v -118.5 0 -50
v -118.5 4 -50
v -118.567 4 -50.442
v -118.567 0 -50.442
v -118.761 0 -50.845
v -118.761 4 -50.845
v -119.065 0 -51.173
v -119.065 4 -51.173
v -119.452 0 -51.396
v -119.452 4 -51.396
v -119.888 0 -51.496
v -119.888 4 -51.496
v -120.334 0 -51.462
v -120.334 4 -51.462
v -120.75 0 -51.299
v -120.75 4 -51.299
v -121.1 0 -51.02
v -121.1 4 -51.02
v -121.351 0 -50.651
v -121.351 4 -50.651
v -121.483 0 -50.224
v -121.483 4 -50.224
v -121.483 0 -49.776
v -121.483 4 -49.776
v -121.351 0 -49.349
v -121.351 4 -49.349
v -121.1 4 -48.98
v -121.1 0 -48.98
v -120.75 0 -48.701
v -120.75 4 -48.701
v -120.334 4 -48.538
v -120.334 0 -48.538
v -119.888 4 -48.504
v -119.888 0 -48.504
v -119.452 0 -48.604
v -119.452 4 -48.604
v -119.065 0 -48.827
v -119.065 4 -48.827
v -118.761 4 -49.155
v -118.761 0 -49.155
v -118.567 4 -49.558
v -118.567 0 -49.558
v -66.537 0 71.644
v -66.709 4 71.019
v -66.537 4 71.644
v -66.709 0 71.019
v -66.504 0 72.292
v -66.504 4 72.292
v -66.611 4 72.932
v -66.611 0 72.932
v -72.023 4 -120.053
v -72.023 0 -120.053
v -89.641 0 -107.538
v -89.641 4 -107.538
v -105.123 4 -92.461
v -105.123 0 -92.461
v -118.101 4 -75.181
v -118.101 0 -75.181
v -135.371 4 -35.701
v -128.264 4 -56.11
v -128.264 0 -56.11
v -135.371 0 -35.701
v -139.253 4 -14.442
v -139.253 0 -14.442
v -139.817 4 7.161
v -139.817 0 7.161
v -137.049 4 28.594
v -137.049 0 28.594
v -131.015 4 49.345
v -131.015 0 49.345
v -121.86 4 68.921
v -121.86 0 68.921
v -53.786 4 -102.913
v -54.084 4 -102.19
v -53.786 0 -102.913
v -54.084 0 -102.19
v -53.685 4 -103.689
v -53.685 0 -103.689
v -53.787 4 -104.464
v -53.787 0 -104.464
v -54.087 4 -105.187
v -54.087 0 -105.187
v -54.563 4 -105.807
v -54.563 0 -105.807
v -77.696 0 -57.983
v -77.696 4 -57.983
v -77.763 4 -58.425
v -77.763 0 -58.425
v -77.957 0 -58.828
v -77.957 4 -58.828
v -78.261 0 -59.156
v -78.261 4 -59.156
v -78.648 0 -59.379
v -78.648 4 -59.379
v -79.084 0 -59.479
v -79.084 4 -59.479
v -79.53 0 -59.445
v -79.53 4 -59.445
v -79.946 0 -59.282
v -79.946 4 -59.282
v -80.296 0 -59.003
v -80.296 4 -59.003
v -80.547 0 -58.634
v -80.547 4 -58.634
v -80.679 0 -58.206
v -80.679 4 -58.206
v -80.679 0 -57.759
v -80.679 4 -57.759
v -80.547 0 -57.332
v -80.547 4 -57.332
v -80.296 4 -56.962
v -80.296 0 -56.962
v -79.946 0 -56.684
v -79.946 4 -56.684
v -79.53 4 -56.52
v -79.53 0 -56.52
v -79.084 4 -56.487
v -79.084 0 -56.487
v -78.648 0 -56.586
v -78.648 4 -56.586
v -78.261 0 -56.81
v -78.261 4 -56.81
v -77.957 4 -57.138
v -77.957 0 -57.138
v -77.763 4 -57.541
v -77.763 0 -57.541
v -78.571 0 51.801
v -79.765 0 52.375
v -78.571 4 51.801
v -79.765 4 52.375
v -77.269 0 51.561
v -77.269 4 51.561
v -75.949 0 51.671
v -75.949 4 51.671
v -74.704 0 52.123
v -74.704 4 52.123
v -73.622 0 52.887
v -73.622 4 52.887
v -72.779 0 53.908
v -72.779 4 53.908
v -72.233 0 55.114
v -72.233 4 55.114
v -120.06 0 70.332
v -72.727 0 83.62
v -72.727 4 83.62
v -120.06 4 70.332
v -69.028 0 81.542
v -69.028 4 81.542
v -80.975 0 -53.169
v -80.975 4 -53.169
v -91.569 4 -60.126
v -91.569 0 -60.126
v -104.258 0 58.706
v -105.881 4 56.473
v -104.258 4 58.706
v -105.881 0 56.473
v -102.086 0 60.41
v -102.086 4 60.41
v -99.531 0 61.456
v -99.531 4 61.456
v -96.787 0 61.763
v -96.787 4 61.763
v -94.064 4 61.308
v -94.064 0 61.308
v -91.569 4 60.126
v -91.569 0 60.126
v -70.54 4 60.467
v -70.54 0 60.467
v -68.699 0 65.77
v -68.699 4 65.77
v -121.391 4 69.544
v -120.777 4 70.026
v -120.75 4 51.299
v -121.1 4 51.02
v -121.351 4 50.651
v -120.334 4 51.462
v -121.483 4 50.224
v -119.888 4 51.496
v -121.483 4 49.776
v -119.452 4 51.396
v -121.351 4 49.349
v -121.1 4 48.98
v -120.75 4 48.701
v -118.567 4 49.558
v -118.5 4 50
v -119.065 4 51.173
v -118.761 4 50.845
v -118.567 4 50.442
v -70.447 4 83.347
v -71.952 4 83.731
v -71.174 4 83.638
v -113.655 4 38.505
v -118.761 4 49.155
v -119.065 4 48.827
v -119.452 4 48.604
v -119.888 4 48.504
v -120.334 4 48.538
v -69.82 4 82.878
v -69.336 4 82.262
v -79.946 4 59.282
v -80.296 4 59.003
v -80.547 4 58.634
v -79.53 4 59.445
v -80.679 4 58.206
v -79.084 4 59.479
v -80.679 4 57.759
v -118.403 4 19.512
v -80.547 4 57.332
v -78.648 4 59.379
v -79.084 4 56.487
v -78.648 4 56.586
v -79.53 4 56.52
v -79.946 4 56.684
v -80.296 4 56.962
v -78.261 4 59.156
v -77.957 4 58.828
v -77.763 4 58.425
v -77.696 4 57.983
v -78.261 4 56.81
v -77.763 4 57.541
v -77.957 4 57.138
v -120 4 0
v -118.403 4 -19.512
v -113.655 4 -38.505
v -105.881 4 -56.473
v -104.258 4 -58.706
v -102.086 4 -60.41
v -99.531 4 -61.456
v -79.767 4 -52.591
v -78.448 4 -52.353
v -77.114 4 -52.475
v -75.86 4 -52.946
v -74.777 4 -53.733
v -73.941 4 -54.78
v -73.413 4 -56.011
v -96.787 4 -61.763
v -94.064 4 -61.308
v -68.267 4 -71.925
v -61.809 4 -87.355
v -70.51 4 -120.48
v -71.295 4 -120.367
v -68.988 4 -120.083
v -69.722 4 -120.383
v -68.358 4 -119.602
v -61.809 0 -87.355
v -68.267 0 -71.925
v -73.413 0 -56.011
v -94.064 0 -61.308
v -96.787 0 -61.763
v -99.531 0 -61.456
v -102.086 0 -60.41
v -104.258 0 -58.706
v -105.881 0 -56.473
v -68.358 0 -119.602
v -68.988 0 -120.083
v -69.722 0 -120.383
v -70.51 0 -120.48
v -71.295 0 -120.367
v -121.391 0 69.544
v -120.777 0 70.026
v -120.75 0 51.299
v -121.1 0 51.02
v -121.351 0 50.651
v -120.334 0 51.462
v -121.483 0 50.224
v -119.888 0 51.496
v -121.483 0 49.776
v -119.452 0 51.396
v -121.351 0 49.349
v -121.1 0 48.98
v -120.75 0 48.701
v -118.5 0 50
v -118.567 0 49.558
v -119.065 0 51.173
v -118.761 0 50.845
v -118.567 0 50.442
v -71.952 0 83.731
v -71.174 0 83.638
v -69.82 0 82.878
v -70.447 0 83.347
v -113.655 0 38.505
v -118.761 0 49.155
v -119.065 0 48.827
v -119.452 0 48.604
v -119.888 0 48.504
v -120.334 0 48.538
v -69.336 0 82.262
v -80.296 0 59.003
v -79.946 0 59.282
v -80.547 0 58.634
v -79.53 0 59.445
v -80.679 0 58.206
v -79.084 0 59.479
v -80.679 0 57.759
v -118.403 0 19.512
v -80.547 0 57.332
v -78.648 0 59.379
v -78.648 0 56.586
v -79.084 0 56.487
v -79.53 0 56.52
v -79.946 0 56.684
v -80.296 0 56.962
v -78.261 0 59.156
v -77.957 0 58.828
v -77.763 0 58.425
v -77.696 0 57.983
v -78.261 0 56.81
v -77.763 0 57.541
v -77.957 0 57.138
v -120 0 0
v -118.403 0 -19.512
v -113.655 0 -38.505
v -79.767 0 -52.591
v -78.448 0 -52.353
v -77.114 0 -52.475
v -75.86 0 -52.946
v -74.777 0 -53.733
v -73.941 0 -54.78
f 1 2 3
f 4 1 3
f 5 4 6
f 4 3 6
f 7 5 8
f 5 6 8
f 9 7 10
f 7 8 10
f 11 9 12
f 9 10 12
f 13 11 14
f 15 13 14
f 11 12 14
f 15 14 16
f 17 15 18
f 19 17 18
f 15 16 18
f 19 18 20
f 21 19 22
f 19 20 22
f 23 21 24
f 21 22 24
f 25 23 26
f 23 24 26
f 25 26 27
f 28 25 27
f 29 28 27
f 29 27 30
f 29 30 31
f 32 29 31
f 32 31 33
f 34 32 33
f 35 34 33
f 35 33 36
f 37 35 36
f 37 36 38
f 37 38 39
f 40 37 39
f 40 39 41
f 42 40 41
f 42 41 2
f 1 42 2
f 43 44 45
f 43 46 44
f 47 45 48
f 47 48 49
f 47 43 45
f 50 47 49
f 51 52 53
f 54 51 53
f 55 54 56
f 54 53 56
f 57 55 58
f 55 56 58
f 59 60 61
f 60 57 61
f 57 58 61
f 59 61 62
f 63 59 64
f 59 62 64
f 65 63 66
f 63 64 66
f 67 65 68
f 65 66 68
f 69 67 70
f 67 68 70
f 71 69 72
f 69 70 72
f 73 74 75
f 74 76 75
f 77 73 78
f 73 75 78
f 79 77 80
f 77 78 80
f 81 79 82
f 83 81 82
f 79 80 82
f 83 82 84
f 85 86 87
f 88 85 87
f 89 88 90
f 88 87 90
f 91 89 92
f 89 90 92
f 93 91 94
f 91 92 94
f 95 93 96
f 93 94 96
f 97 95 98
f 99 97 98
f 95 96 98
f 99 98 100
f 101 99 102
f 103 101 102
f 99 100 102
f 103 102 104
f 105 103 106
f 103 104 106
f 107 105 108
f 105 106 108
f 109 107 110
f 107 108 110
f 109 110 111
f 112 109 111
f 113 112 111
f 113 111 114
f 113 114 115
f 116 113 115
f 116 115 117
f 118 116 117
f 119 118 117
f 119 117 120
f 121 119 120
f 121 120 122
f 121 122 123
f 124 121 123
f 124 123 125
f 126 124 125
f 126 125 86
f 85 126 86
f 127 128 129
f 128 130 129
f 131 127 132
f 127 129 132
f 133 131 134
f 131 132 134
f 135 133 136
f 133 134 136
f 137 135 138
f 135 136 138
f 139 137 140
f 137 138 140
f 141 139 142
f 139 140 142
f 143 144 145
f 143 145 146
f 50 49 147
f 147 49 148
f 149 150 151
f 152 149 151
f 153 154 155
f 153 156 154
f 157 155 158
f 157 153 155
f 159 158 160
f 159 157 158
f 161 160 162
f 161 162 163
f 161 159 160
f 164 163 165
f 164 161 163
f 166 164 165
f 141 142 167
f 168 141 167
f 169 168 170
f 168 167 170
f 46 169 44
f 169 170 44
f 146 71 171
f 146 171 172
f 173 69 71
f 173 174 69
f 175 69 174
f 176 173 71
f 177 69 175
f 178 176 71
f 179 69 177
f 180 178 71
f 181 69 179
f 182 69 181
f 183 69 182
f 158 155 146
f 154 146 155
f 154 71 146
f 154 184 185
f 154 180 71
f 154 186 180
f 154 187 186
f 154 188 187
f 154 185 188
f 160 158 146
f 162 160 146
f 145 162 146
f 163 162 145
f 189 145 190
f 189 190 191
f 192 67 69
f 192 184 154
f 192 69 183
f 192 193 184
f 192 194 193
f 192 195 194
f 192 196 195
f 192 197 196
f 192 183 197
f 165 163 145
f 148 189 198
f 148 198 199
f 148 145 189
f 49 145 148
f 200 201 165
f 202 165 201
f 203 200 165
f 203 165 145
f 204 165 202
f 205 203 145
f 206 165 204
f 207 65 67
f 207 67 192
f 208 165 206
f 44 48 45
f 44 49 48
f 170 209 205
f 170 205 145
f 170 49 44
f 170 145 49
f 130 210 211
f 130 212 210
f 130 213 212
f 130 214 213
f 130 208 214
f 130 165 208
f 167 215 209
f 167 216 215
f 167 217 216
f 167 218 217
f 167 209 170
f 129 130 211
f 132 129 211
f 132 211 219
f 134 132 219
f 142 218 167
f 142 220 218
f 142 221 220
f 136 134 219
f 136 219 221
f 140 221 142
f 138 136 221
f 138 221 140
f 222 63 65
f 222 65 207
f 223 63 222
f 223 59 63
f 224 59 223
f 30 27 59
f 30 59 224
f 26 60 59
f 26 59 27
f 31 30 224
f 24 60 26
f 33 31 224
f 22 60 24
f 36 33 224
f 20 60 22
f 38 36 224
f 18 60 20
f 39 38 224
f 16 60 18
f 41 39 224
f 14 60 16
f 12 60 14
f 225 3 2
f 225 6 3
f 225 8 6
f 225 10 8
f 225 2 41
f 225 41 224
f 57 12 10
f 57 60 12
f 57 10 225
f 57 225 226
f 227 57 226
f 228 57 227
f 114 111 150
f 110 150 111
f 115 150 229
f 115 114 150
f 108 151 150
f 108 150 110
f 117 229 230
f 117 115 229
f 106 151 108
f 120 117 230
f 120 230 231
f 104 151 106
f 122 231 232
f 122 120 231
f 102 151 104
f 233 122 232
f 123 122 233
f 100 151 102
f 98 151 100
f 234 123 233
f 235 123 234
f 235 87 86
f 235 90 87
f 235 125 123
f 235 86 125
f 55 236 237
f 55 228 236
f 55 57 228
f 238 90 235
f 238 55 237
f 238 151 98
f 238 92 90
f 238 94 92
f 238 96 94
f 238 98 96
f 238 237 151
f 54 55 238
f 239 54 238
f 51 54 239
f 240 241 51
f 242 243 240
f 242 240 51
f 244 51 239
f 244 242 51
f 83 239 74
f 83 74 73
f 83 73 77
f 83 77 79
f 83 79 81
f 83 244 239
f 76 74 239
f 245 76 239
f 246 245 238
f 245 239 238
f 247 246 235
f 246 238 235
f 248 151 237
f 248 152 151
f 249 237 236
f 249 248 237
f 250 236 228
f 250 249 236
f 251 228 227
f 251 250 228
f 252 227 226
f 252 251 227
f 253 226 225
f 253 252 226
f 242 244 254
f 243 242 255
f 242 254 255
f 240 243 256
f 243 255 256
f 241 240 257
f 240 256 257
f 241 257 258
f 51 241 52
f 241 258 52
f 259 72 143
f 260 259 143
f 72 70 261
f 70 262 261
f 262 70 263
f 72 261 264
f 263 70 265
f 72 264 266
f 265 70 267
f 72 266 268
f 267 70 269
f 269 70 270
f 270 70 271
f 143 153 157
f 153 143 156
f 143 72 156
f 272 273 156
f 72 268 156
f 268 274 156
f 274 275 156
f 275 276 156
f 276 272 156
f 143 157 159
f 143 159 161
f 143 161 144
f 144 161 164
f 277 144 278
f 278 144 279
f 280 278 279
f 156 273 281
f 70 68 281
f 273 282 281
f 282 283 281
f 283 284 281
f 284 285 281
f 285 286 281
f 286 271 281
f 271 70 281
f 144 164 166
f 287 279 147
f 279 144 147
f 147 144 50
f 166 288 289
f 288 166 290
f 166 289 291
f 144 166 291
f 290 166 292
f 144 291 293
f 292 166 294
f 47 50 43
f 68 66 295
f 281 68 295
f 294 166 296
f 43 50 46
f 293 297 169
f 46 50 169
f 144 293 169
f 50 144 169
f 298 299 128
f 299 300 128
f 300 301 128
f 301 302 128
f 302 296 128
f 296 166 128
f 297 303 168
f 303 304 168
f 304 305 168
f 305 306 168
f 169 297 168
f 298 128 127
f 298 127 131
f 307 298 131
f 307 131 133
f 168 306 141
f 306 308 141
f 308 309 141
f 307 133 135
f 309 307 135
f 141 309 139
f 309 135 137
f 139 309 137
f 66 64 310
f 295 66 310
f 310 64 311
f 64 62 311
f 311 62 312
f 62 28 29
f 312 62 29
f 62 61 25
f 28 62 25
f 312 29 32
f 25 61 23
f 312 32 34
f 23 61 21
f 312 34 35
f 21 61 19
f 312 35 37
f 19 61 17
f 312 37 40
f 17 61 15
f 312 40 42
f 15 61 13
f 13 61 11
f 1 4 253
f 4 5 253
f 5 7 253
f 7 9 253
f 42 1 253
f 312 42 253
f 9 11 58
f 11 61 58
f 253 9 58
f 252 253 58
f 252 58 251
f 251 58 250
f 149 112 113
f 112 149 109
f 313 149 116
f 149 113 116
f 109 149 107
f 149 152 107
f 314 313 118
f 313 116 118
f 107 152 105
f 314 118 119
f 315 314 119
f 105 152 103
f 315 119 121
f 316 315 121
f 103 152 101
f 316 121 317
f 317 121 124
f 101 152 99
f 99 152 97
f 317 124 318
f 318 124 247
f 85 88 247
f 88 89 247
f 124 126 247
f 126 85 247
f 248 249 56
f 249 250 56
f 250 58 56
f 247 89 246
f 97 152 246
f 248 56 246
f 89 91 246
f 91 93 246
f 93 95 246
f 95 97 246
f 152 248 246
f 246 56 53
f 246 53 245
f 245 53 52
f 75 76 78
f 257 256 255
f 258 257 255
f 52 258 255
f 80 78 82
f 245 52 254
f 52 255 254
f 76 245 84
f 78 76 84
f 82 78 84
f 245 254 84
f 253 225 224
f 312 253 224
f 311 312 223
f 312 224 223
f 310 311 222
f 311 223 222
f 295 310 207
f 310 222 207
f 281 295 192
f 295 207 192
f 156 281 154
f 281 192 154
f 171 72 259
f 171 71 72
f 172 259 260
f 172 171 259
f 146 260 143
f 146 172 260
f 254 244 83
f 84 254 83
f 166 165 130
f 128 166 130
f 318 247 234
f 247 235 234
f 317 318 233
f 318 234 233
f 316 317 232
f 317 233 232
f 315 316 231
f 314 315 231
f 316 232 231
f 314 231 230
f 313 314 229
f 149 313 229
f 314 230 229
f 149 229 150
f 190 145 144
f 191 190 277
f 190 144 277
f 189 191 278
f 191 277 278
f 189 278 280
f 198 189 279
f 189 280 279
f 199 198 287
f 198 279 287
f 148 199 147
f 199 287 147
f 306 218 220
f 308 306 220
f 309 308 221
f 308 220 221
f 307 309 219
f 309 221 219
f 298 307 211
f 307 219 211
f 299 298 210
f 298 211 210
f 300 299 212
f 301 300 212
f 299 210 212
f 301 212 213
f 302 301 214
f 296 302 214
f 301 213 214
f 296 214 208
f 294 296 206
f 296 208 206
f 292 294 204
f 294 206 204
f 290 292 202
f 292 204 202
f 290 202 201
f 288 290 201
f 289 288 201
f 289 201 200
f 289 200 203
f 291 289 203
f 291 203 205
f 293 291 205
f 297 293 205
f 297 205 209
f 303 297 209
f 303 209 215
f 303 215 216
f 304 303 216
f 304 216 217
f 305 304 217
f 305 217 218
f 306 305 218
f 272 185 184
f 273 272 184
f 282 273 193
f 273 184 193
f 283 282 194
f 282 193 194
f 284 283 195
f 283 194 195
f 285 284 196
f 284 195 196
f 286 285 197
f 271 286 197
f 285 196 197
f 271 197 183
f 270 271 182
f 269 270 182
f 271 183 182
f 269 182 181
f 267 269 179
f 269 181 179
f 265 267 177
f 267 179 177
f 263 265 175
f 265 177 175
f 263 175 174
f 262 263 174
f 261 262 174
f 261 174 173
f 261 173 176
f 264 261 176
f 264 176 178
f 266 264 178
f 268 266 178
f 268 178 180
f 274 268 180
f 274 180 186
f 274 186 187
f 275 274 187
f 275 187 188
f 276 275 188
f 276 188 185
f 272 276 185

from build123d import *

# Parameters (mm, degrees)
SKETCH1_R               = 140
BOSS_EXTRUDE1_DEPTH     = 4
CUT_EXTRUDE1_REACH      = 6
CUT_EXTRUDE3_REACH      = 6
SKETCH19_R              = 1.5
CUT_EXTRUDE4_REACH      = 6
FILLET2_R               = 10
CUT_EXTRUDE8_DEPTH      = 1
CUT_EXTRUDE8_DEPTH_BACK = 5
CUT_EXTRUDE9_REACH      = 6
FILLET4_R               = 5
FILLET6_R               = 10
CUT_EXTRUDE10_REACH     = 6
SKETCH25_R              = 1.5
FILLET5_R               = 3


with BuildPart() as part:
    # Sketch1 → Boss-Extrude1 (new body)
    with BuildSketch(Plane(origin=(0, 0, 0), x_dir=(1, 0, 0), z_dir=(0, 1, 0))):
        Circle(SKETCH1_R)
    extrude(amount=BOSS_EXTRUDE1_DEPTH)

    # Sketch17 → Cut-Extrude1 (cut, up to next)
    with BuildSketch(Plane.XZ, mode=Mode.PRIVATE) as cut_extrude1_sk1:
        Polygon((-50, 90), (-121.24355653, 70), (-121.24355653, 140), (121.24355653, 140), (121.24355653, 70), (50, 90), align=None)
    cut_extrude1_tool1 = extrude(cut_extrude1_sk1.sketch, amount=-CUT_EXTRUDE1_REACH, mode=Mode.PRIVATE) & part.part
    add(cut_extrude1_tool1.solids().sort_by_distance((0, 0, 111.669853))[0], mode=Mode.SUBTRACT)

    # Sketch19 → Cut-Extrude3 (cut, up to next)
    with BuildSketch(Plane(origin=(0, 4, 0), x_dir=(1, 0, 0), z_dir=(0, 1, 0)), mode=Mode.PRIVATE) as cut_extrude3_sk1:
        with Locations((-79.195959493, -57.982756057)):
            Circle(SKETCH19_R)
    cut_extrude3_tool1 = extrude(cut_extrude3_sk1.sketch, amount=-CUT_EXTRUDE3_REACH, mode=Mode.PRIVATE) & part.part
    add(cut_extrude3_tool1.solids().sort_by_distance((-79.195959, 4, 57.982756))[0], mode=Mode.SUBTRACT)
    # Sketch19 → Cut-Extrude3 (cut, up to next)
    with BuildSketch(Plane(origin=(0, 4, 0), x_dir=(1, 0, 0), z_dir=(0, 1, 0)), mode=Mode.PRIVATE) as cut_extrude3_sk2:
        with Locations((-79.195959493, 57.982756057)):
            Circle(SKETCH19_R)
    cut_extrude3_tool2 = extrude(cut_extrude3_sk2.sketch, amount=-CUT_EXTRUDE3_REACH, mode=Mode.PRIVATE) & part.part
    add(cut_extrude3_tool2.solids().sort_by_distance((-79.195959, 4, -57.982756))[0], mode=Mode.SUBTRACT)
    # Sketch19 → Cut-Extrude3 (cut, up to next)
    with BuildSketch(Plane(origin=(0, 4, 0), x_dir=(1, 0, 0), z_dir=(0, 1, 0)), mode=Mode.PRIVATE) as cut_extrude3_sk3:
        with Locations((79.195959493, 57.982756057)):
            Circle(SKETCH19_R)
    cut_extrude3_tool3 = extrude(cut_extrude3_sk3.sketch, amount=-CUT_EXTRUDE3_REACH, mode=Mode.PRIVATE) & part.part
    add(cut_extrude3_tool3.solids().sort_by_distance((79.195959, 4, -57.982756))[0], mode=Mode.SUBTRACT)
    # Sketch19 → Cut-Extrude3 (cut, up to next)
    with BuildSketch(Plane(origin=(0, 4, 0), x_dir=(1, 0, 0), z_dir=(0, 1, 0)), mode=Mode.PRIVATE) as cut_extrude3_sk4:
        with Locations((79.195959493, -57.982756057)):
            Circle(SKETCH19_R)
    cut_extrude3_tool4 = extrude(cut_extrude3_sk4.sketch, amount=-CUT_EXTRUDE3_REACH, mode=Mode.PRIVATE) & part.part
    add(cut_extrude3_tool4.solids().sort_by_distance((79.195959, 4, 57.982756))[0], mode=Mode.SUBTRACT)
    # Sketch19 → Cut-Extrude3 (cut, up to next)
    with BuildSketch(Plane(origin=(0, 4, 0), x_dir=(1, 0, 0), z_dir=(0, 1, 0)), mode=Mode.PRIVATE) as cut_extrude3_sk5:
        with Locations((-57.982756057, 79.195959493)):
            Circle(SKETCH19_R)
    cut_extrude3_tool5 = extrude(cut_extrude3_sk5.sketch, amount=-CUT_EXTRUDE3_REACH, mode=Mode.PRIVATE) & part.part
    add(cut_extrude3_tool5.solids().sort_by_distance((-57.982756, 4, -79.195959))[0], mode=Mode.SUBTRACT)
    # Sketch19 → Cut-Extrude3 (cut, up to next)
    with BuildSketch(Plane(origin=(0, 4, 0), x_dir=(1, 0, 0), z_dir=(0, 1, 0)), mode=Mode.PRIVATE) as cut_extrude3_sk6:
        with Locations((57.982756057, 79.195959493)):
            Circle(SKETCH19_R)
    cut_extrude3_tool6 = extrude(cut_extrude3_sk6.sketch, amount=-CUT_EXTRUDE3_REACH, mode=Mode.PRIVATE) & part.part
    add(cut_extrude3_tool6.solids().sort_by_distance((57.982756, 4, -79.195959))[0], mode=Mode.SUBTRACT)
    # Sketch19 → Cut-Extrude3 (cut, up to next)
    with BuildSketch(Plane(origin=(0, 4, 0), x_dir=(1, 0, 0), z_dir=(0, 1, 0)), mode=Mode.PRIVATE) as cut_extrude3_sk7:
        with Locations((57.982756057, -79.195959493)):
            Circle(SKETCH19_R)
    cut_extrude3_tool7 = extrude(cut_extrude3_sk7.sketch, amount=-CUT_EXTRUDE3_REACH, mode=Mode.PRIVATE) & part.part
    add(cut_extrude3_tool7.solids().sort_by_distance((57.982756, 4, 79.195959))[0], mode=Mode.SUBTRACT)
    # Sketch19 → Cut-Extrude3 (cut, up to next)
    with BuildSketch(Plane(origin=(0, 4, 0), x_dir=(1, 0, 0), z_dir=(0, 1, 0)), mode=Mode.PRIVATE) as cut_extrude3_sk8:
        with Locations((-57.982756057, -79.195959493)):
            Circle(SKETCH19_R)
    cut_extrude3_tool8 = extrude(cut_extrude3_sk8.sketch, amount=-CUT_EXTRUDE3_REACH, mode=Mode.PRIVATE) & part.part
    add(cut_extrude3_tool8.solids().sort_by_distance((-57.982756, 4, 79.195959))[0], mode=Mode.SUBTRACT)

    # Sketch20 → Cut-Extrude4 (cut, up to next)
    with BuildSketch(Plane(origin=(0, 4, 0), x_dir=(1, 0, 0), z_dir=(0, 1, 0)), mode=Mode.PRIVATE) as cut_extrude4_sk1:
        Polygon((-498.316459894, 549.560016424), (-70, 121.24355653), (-50, 101.24355653), (50, 101.24355653), (70, 121.24355653), (498.316459894, 549.560016424), (498.316459894, 1761.021909565), (-498.316459894, 1761.021909565), align=None)
    cut_extrude4_tool1 = extrude(cut_extrude4_sk1.sketch, amount=-CUT_EXTRUDE4_REACH, mode=Mode.PRIVATE) & part.part
    add(cut_extrude4_tool1.solids().sort_by_distance((0, 4, -1025.243605))[0], mode=Mode.SUBTRACT)

    # Fillet2
    fillet2_edges = [part.edges().sort_by_distance(p)[0] for p in [
        (50, 2, -101.24355653),
        (-50, 2, -101.24355653),
    ]]
    fillet(fillet2_edges, radius=FILLET2_R)

    # Sketch23 → Cut-Extrude8 (cut, two sides)
    with BuildSketch(Plane(origin=(0, 4, 0), x_dir=(1, 0, 0), z_dir=(0, 1, 0))) as cut_extrude8_sk:
        with BuildLine():
            Line((261.924008605, 637.436261059), (-52.928932188, 104.172488718))
            ThreePointArc((-52.928932188, 104.172488718), (-80.130232259, 17.669229552), (-66.336519501, -71.95475195))
            Line((-66.336519501, -71.95475195), (-73.189737717, -96.367133919))
            Line((-73.189737717, -96.367133919), (-240.56703475, -692.594830068))
            Line((-240.56703475, -692.594830068), (918.053550165, -1130.326301498))
            Line((918.053550165, -1130.326301498), (1420.54459352, 199.704789628))
            Line((1420.54459352, 199.704789628), (261.924008605, 637.436261059))
        make_face()
    extrude(amount=CUT_EXTRUDE8_DEPTH, mode=Mode.SUBTRACT)
    extrude(cut_extrude8_sk.sketch, amount=-CUT_EXTRUDE8_DEPTH_BACK, mode=Mode.SUBTRACT)

    # Sketch24 → Cut-Extrude9 (cut, up to next)
    with BuildSketch(Plane(origin=(0, 4, 0), x_dir=(1, 0, 0), z_dir=(0, 1, 0)), mode=Mode.PRIVATE) as cut_extrude9_sk1:
        with BuildLine():
            Line((0, 0), (-100.308962252, 65.864346136))
            ThreePointArc((-100.308962252, 65.864346136), (-120, 0), (-100.308962252, -65.864346136))
            Line((-100.308962252, -65.864346136), (0, 0))
        make_face()
    cut_extrude9_tool1 = extrude(cut_extrude9_sk1.sketch, amount=-CUT_EXTRUDE9_REACH, mode=Mode.PRIVATE) & part.part
    add(cut_extrude9_tool1.solids().sort_by_distance((-75.574375, 4, 0))[0], mode=Mode.SUBTRACT)

    # Fillet4
    fillet4_edges = [part.edges().sort_by_distance(p)[0] for p in [
        (-74.063830686, 2, 48.63140512),
        (-75.142204111, 2, -49.339481038),
    ]]
    fillet(fillet4_edges, radius=FILLET4_R)

    # Fillet6
    fillet6_edges = [part.edges().sort_by_distance(p)[0] for p in [
        (-100.308962252, 2, 65.864346136),
        (-100.308962252, 2, -65.864346136),
    ]]
    fillet(fillet6_edges, radius=FILLET6_R)

    # Sketch25 → Cut-Extrude10 (cut, up to next)
    with BuildSketch(Plane(origin=(0, 4, 0), x_dir=(1, 0, 0), z_dir=(0, 1, 0)), mode=Mode.PRIVATE) as cut_extrude10_sk1:
        with Locations((-120, 50)):
            Circle(SKETCH25_R)
    cut_extrude10_tool1 = extrude(cut_extrude10_sk1.sketch, amount=-CUT_EXTRUDE10_REACH, mode=Mode.PRIVATE) & part.part
    add(cut_extrude10_tool1.solids().sort_by_distance((-120, 4, -50))[0], mode=Mode.SUBTRACT)
    # Sketch25 → Cut-Extrude10 (cut, up to next)
    with BuildSketch(Plane(origin=(0, 4, 0), x_dir=(1, 0, 0), z_dir=(0, 1, 0)), mode=Mode.PRIVATE) as cut_extrude10_sk2:
        with Locations((-120, -50)):
            Circle(SKETCH25_R)
    cut_extrude10_tool2 = extrude(cut_extrude10_sk2.sketch, amount=-CUT_EXTRUDE10_REACH, mode=Mode.PRIVATE) & part.part
    add(cut_extrude10_tool2.solids().sort_by_distance((-120, 4, 50))[0], mode=Mode.SUBTRACT)

    # Fillet5
    fillet5_edges = [part.edges().sort_by_distance(p)[0] for p in [
        (-121.24355653, 2, 70),
        (-70, 2, -121.24355653),
        (-52.928932188, 2, -104.172488718),
        (-69.838855295, 2, 84.430694855),
        (-66.336519501, 2, 71.95475195),
    ]]
    fillet(fillet5_edges, radius=FILLET5_R)


solid = part.part
